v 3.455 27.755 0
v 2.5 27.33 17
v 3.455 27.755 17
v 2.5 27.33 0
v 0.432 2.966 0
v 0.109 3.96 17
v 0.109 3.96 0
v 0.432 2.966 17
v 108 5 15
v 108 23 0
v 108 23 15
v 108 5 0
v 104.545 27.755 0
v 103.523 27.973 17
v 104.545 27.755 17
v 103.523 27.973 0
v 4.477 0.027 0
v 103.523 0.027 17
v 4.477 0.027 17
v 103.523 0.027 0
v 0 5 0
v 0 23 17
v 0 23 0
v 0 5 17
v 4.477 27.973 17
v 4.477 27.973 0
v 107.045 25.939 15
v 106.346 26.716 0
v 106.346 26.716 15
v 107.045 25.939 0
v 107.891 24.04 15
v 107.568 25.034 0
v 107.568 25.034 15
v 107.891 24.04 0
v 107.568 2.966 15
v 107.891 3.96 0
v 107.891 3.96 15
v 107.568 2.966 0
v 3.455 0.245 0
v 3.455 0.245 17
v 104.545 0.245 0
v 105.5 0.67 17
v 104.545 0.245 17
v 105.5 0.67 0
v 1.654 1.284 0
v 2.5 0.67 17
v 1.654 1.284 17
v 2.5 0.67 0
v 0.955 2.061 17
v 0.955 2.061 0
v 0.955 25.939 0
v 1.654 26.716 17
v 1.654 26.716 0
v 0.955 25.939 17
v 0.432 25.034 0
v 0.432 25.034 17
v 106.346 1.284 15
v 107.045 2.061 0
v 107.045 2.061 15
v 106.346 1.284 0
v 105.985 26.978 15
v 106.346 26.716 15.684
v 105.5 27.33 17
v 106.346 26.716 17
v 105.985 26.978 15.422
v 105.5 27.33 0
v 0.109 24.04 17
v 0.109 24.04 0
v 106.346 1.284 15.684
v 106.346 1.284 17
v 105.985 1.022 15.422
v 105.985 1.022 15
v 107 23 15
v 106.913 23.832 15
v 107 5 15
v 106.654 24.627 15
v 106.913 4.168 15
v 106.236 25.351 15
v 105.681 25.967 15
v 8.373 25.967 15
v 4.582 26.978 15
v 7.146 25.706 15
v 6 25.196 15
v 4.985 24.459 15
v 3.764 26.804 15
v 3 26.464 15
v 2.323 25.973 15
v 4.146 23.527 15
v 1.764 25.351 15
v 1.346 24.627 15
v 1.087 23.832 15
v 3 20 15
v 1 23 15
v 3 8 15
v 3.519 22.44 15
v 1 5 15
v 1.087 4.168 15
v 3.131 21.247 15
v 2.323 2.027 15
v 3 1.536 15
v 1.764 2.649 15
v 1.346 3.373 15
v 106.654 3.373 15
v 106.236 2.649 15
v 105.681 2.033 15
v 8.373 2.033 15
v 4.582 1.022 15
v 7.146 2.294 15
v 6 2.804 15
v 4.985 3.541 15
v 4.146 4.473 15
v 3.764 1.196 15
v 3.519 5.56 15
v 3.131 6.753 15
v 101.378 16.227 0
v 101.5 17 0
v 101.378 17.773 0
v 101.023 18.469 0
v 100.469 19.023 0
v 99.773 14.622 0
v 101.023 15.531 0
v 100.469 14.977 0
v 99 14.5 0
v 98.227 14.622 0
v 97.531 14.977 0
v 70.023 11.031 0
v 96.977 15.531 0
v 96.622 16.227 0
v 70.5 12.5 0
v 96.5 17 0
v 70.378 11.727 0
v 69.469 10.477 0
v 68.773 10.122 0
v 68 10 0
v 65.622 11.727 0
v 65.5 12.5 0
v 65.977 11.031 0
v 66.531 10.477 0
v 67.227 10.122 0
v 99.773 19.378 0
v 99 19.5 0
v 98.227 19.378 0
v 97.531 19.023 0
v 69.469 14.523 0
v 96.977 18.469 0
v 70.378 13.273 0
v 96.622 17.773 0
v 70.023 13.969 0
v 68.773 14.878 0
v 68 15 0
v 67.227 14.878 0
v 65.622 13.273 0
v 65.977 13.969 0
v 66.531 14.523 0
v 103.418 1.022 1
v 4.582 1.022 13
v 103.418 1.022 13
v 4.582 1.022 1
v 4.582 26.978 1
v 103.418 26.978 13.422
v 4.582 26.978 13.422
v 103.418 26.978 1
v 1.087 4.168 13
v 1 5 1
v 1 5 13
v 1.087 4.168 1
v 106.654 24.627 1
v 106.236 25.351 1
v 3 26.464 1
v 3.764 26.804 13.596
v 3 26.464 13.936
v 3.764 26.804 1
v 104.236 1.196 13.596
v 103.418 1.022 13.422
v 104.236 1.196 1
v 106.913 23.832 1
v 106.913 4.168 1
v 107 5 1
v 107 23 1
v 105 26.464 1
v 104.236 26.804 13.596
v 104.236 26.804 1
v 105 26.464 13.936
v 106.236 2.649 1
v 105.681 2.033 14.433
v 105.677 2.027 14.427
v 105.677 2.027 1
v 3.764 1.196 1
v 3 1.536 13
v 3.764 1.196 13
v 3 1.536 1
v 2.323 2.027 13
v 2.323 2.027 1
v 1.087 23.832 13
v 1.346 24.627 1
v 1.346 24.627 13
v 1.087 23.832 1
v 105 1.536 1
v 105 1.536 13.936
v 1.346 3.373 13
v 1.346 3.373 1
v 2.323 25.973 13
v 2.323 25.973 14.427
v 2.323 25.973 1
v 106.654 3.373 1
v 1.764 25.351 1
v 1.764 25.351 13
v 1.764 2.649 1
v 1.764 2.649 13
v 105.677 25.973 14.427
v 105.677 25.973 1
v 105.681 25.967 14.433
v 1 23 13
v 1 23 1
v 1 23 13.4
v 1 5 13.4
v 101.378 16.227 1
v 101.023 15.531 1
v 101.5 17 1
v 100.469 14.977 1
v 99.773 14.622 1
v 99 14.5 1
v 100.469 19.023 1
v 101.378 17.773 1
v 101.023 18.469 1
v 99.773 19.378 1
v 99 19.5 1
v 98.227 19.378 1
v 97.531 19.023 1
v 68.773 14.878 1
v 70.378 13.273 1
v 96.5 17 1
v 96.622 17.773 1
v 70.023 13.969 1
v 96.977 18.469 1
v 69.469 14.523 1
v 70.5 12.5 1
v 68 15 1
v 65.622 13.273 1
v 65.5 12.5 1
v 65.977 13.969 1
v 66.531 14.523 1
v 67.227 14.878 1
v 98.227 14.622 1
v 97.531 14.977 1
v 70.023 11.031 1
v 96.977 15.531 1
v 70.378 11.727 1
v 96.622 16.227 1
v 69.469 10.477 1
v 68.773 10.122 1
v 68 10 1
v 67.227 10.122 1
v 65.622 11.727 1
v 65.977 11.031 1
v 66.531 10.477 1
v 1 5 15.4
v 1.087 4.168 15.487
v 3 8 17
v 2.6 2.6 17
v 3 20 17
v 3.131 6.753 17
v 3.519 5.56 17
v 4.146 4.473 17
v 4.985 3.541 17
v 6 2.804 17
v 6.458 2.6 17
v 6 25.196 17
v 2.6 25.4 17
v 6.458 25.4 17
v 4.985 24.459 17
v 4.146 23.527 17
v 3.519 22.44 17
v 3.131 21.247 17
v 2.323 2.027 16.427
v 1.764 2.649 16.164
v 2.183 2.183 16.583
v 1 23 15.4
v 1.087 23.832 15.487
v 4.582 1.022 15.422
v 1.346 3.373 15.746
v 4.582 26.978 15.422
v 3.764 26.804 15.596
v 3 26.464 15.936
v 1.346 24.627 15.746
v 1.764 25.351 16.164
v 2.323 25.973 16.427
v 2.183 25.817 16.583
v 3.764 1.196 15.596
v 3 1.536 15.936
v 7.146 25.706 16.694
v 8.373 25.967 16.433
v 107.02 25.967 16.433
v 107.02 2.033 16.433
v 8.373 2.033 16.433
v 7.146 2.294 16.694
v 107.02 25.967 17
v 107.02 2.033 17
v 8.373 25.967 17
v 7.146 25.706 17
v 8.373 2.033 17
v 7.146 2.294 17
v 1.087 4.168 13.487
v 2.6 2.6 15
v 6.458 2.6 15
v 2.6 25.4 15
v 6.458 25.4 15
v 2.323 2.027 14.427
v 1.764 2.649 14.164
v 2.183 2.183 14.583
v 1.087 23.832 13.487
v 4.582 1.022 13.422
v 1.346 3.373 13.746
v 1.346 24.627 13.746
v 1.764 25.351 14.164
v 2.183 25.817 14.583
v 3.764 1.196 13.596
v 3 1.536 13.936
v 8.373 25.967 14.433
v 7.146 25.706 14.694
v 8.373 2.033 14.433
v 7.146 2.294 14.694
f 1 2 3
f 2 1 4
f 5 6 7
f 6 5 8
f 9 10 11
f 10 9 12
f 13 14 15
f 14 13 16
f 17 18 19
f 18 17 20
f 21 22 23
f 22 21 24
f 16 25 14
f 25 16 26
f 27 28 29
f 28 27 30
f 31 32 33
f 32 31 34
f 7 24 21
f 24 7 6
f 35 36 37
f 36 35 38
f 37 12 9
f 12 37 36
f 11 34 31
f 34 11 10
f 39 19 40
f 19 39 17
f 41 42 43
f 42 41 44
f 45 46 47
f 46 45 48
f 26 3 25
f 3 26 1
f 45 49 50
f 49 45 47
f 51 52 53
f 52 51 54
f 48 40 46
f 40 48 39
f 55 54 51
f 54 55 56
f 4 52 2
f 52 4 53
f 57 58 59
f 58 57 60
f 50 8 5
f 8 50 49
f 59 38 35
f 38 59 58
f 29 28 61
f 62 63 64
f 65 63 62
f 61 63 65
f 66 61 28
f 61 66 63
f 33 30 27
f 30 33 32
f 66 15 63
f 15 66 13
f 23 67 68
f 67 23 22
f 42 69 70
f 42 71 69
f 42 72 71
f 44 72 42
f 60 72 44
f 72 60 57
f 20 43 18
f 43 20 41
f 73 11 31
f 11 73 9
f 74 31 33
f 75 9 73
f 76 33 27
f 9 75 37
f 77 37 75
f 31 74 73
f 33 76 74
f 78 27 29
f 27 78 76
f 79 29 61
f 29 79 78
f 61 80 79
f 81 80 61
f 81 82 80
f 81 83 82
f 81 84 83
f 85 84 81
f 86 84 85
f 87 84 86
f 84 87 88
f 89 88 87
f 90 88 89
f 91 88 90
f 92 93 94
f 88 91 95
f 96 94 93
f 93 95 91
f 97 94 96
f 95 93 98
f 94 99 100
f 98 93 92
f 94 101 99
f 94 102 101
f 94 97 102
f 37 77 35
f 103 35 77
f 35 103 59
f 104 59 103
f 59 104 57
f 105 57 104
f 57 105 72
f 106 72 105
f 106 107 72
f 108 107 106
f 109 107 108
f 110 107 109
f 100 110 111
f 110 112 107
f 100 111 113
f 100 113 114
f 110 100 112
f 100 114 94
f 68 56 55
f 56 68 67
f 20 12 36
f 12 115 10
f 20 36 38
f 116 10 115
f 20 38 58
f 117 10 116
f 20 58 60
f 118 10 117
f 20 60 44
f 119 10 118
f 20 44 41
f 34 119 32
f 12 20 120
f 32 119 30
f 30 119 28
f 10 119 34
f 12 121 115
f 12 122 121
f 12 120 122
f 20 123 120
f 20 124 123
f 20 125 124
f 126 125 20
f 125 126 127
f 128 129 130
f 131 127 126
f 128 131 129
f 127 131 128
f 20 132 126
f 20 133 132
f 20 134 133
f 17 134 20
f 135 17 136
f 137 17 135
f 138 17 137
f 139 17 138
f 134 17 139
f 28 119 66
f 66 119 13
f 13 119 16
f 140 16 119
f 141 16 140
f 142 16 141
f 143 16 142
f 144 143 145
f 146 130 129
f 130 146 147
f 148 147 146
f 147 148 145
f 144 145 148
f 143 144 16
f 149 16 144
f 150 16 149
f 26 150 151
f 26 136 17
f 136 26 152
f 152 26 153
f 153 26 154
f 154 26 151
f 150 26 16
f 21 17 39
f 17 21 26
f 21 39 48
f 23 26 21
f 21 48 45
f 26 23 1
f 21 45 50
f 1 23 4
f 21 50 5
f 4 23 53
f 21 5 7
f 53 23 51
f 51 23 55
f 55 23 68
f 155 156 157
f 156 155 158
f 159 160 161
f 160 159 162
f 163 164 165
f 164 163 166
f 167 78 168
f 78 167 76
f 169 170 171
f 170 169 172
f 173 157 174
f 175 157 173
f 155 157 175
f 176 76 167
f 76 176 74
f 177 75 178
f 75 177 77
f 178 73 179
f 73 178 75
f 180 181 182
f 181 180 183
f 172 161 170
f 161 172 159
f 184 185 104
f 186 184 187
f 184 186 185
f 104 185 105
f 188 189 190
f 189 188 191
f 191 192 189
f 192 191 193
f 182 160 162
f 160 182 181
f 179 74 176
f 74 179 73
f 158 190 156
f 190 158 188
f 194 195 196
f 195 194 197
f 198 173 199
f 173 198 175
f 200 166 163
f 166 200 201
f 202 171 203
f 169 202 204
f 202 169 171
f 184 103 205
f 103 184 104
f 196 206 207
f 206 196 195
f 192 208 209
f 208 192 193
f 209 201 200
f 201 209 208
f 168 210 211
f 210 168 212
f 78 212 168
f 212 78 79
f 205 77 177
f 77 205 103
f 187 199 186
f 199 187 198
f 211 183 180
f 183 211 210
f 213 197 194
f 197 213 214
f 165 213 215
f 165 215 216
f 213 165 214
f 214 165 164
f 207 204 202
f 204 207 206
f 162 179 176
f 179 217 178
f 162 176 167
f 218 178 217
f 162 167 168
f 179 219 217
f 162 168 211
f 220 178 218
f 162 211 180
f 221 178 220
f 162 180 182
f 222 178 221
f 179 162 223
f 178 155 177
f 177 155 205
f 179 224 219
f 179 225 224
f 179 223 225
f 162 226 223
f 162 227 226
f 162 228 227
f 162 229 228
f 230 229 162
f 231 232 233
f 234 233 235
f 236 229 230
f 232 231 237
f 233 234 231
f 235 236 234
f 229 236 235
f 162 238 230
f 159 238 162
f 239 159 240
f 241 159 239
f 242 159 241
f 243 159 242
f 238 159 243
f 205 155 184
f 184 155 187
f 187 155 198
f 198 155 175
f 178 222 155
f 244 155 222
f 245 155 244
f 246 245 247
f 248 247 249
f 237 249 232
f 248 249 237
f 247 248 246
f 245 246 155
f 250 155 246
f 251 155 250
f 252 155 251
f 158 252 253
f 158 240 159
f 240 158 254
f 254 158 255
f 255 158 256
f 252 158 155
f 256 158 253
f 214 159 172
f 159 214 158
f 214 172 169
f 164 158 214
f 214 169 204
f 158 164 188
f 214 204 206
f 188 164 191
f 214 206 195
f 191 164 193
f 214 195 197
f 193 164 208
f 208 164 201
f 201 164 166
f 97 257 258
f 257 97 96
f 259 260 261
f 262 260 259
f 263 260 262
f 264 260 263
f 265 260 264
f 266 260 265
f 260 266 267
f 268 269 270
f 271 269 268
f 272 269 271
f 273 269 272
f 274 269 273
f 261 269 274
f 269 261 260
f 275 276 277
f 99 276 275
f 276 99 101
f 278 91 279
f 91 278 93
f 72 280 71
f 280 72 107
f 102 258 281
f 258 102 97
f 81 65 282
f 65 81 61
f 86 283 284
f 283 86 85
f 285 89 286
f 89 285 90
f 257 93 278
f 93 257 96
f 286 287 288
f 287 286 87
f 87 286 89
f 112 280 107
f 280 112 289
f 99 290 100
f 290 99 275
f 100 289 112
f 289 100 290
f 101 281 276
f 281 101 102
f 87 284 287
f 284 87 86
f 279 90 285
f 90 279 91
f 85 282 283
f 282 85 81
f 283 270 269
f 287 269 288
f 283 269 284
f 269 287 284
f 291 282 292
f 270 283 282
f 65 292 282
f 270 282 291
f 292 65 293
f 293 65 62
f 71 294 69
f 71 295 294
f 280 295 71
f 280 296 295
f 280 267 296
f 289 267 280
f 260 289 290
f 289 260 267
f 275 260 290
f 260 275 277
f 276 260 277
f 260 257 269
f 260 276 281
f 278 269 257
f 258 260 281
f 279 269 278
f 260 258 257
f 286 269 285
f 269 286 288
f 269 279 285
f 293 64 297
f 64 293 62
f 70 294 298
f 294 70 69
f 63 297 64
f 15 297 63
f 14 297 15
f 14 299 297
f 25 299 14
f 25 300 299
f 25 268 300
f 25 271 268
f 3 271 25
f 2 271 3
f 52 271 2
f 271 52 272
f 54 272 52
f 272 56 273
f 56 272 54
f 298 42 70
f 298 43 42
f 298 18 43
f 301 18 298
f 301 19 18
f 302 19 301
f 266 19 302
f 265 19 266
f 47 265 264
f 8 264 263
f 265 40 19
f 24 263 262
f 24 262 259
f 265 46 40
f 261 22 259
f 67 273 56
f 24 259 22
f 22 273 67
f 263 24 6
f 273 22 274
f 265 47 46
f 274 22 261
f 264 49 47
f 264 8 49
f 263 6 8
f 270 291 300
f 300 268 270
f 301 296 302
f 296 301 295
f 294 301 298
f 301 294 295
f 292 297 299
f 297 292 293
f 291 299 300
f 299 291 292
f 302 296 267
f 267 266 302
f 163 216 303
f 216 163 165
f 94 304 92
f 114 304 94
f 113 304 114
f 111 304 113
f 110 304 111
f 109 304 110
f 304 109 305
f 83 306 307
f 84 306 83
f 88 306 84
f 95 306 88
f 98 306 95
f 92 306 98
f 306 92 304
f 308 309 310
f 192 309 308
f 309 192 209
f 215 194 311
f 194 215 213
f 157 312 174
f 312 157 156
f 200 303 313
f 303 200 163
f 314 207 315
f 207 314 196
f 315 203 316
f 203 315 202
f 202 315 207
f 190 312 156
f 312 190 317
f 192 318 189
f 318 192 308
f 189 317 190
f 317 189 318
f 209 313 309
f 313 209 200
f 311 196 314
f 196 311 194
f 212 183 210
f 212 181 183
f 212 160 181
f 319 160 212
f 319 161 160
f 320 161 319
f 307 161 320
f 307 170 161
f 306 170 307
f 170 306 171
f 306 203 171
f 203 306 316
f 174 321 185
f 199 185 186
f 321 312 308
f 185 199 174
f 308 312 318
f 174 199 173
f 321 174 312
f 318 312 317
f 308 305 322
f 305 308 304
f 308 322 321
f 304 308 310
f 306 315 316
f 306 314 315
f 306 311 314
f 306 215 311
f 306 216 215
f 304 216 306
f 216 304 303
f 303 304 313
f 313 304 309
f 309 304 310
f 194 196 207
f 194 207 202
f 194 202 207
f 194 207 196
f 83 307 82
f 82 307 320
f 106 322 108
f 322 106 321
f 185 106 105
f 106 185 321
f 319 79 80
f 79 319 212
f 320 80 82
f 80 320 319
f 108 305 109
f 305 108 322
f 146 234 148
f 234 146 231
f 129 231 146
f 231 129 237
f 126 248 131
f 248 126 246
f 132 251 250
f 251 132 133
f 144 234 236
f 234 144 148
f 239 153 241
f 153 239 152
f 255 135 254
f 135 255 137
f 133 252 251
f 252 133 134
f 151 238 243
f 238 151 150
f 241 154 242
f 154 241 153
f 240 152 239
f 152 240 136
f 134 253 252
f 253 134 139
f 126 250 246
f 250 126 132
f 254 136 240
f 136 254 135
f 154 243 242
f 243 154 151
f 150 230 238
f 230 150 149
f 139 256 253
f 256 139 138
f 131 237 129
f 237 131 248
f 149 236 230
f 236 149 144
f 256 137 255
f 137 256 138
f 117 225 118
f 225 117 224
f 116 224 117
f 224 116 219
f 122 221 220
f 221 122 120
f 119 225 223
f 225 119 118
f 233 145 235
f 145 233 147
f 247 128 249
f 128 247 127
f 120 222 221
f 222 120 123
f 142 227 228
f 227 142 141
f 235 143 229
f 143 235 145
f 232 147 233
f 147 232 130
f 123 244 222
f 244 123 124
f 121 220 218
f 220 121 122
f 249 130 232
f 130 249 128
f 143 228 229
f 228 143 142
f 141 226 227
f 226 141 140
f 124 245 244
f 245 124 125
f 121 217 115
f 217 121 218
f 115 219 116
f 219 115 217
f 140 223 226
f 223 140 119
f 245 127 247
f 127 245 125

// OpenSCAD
itemsShown="box"; // [both,box,lid]
boxLength=108;
boxWidth=28;
boxHeight=17;
cornerRadius=5;
wallThickness=1;
bottomThickness=1;
lidThickness=2;
lidClearance=0.4;
lidEdgeThickness=0.5;
// Notch in the lid
withNotch=false;//true;//[true:false]

/* [Global] */
if (itemsShown=="box") Box();
if (itemsShown=="lid") showLid();
if (itemsShown=="both"){Box();showLid();}


module Box() {
    difference () {
        showBox();
        // hole for for switch
        translate([15+53,12.5,-1]) cylinder (h=10, d=5, $fn=20);
        // hole for buzzer
        translate([46+53,17,-1]) cylinder (h=10, d=5, $fn=20);
    }
}


module showLid(){
	translate ([0, -2*wallThickness, 0]) 
	roundBoxLid(l=boxLength-wallThickness,
				w=boxWidth-2*wallThickness-lidClearance,
				h=lidThickness,
				et=lidEdgeThickness,
				r=cornerRadius-wallThickness,
				notch=withNotch);
}

module showBox(){
	round_box(l=boxLength,
			  w=boxWidth,
			  h=boxHeight,
			  bt=bottomThickness,
			  wt=wallThickness,
			  lt=lidThickness,
			  r=cornerRadius);
}

module round_box(l=40,w=30,h=30,bt=2,wt=2,lt=2,r=5,){
	difference() { 
		round_cube(l=l,w=w,h=h-lt,r=r);
		translate ([wt, wt, bt]) 
		round_cube(l=l-wt*2,w=w-wt*2,h=h,r=r-wt);
	}
	//use two box rims. one to make a slope to support the lid
	roundBoxRim();
	translate ([0, 0, -wt*2]) roundBoxRim();
}

module roundBoxRim(l=boxLength,
				   w=boxWidth,
				   h=boxHeight,
				   et=lidEdgeThickness,
				   r=cornerRadius,
				   wt=wallThickness,
				   lt=lidThickness){
	difference() { 
		translate ([0, 0, h-lt]) 
		round_cube(l=l,w=w,h=lt,r=r);
		translate ([wt+lt,wt+lt-et*2,h-lt-0.1]) 
		round_cube(l=l*2,w=w-2*(wt+lt)+4*et,h=lt+0.2,r=r-wt+lt);

		//subtract out a lid to make the ledge
		translate ([wt, w-wt, h-lt-0.1])
		roundBoxLid(l=l*2,w=w-2*wt,h=lt+0.1,wt=wt,t=lt,et=0.5,r=r-wt,notch=false);
	}
}

module roundBoxLid(l=40,w=30,h=3,wt=2,t=2,et=0.5,r=5,notch=true){
	translate ([l, 0, 0]) 
	rotate (a = [0, 0, 180]) 
	difference(){
		round_cube(l=l,w=w,h=h,r=r);

		translate ([-1, 0, et]) rotate (a = [45, 0, 0])  cube (size = [l+2, h*2, h*2]); 
		translate ([-1, w, et]) rotate (a = [45, 0, 0])  cube (size = [l+2, h*2, h*2]); 
		translate ([l, -1, et]) rotate (a = [45, 0, 90]) cube (size = [w+2, h*2, h*2]); 
		if (notch==true){
			translate([2,w/2,h+0.001]) thumbNotch(10/2,72,t);
		}
	}
}

module thumbNotch(
	thumbR=12/2,
	angle=72,
	notchHeight=2){

	size=10*thumbR;

	rotate([0,0,90])
	difference(){
		translate([0,
					(thumbR*sin(angle)-notchHeight)/tan(angle),
					 thumbR*sin(angle)-notchHeight])
		rotate([angle,0,0])
		cylinder(r=thumbR,h=size,$fn=30);

		translate([-size,-size,0])
		cube(size*2);
	}
}

module round_cube(l=40,w=30,h=20,r=5,$fn=30){
	hull(){ 
		translate ([r, r, 0]) cylinder (h = h, r=r);
		translate ([r, w-r, 0]) cylinder (h = h, r=r);
		translate ([l-r,w-r, 0]) cylinder (h = h, r=r);
		translate ([l-r, r, 0]) cylinder (h = h, r=r);
	}
}
